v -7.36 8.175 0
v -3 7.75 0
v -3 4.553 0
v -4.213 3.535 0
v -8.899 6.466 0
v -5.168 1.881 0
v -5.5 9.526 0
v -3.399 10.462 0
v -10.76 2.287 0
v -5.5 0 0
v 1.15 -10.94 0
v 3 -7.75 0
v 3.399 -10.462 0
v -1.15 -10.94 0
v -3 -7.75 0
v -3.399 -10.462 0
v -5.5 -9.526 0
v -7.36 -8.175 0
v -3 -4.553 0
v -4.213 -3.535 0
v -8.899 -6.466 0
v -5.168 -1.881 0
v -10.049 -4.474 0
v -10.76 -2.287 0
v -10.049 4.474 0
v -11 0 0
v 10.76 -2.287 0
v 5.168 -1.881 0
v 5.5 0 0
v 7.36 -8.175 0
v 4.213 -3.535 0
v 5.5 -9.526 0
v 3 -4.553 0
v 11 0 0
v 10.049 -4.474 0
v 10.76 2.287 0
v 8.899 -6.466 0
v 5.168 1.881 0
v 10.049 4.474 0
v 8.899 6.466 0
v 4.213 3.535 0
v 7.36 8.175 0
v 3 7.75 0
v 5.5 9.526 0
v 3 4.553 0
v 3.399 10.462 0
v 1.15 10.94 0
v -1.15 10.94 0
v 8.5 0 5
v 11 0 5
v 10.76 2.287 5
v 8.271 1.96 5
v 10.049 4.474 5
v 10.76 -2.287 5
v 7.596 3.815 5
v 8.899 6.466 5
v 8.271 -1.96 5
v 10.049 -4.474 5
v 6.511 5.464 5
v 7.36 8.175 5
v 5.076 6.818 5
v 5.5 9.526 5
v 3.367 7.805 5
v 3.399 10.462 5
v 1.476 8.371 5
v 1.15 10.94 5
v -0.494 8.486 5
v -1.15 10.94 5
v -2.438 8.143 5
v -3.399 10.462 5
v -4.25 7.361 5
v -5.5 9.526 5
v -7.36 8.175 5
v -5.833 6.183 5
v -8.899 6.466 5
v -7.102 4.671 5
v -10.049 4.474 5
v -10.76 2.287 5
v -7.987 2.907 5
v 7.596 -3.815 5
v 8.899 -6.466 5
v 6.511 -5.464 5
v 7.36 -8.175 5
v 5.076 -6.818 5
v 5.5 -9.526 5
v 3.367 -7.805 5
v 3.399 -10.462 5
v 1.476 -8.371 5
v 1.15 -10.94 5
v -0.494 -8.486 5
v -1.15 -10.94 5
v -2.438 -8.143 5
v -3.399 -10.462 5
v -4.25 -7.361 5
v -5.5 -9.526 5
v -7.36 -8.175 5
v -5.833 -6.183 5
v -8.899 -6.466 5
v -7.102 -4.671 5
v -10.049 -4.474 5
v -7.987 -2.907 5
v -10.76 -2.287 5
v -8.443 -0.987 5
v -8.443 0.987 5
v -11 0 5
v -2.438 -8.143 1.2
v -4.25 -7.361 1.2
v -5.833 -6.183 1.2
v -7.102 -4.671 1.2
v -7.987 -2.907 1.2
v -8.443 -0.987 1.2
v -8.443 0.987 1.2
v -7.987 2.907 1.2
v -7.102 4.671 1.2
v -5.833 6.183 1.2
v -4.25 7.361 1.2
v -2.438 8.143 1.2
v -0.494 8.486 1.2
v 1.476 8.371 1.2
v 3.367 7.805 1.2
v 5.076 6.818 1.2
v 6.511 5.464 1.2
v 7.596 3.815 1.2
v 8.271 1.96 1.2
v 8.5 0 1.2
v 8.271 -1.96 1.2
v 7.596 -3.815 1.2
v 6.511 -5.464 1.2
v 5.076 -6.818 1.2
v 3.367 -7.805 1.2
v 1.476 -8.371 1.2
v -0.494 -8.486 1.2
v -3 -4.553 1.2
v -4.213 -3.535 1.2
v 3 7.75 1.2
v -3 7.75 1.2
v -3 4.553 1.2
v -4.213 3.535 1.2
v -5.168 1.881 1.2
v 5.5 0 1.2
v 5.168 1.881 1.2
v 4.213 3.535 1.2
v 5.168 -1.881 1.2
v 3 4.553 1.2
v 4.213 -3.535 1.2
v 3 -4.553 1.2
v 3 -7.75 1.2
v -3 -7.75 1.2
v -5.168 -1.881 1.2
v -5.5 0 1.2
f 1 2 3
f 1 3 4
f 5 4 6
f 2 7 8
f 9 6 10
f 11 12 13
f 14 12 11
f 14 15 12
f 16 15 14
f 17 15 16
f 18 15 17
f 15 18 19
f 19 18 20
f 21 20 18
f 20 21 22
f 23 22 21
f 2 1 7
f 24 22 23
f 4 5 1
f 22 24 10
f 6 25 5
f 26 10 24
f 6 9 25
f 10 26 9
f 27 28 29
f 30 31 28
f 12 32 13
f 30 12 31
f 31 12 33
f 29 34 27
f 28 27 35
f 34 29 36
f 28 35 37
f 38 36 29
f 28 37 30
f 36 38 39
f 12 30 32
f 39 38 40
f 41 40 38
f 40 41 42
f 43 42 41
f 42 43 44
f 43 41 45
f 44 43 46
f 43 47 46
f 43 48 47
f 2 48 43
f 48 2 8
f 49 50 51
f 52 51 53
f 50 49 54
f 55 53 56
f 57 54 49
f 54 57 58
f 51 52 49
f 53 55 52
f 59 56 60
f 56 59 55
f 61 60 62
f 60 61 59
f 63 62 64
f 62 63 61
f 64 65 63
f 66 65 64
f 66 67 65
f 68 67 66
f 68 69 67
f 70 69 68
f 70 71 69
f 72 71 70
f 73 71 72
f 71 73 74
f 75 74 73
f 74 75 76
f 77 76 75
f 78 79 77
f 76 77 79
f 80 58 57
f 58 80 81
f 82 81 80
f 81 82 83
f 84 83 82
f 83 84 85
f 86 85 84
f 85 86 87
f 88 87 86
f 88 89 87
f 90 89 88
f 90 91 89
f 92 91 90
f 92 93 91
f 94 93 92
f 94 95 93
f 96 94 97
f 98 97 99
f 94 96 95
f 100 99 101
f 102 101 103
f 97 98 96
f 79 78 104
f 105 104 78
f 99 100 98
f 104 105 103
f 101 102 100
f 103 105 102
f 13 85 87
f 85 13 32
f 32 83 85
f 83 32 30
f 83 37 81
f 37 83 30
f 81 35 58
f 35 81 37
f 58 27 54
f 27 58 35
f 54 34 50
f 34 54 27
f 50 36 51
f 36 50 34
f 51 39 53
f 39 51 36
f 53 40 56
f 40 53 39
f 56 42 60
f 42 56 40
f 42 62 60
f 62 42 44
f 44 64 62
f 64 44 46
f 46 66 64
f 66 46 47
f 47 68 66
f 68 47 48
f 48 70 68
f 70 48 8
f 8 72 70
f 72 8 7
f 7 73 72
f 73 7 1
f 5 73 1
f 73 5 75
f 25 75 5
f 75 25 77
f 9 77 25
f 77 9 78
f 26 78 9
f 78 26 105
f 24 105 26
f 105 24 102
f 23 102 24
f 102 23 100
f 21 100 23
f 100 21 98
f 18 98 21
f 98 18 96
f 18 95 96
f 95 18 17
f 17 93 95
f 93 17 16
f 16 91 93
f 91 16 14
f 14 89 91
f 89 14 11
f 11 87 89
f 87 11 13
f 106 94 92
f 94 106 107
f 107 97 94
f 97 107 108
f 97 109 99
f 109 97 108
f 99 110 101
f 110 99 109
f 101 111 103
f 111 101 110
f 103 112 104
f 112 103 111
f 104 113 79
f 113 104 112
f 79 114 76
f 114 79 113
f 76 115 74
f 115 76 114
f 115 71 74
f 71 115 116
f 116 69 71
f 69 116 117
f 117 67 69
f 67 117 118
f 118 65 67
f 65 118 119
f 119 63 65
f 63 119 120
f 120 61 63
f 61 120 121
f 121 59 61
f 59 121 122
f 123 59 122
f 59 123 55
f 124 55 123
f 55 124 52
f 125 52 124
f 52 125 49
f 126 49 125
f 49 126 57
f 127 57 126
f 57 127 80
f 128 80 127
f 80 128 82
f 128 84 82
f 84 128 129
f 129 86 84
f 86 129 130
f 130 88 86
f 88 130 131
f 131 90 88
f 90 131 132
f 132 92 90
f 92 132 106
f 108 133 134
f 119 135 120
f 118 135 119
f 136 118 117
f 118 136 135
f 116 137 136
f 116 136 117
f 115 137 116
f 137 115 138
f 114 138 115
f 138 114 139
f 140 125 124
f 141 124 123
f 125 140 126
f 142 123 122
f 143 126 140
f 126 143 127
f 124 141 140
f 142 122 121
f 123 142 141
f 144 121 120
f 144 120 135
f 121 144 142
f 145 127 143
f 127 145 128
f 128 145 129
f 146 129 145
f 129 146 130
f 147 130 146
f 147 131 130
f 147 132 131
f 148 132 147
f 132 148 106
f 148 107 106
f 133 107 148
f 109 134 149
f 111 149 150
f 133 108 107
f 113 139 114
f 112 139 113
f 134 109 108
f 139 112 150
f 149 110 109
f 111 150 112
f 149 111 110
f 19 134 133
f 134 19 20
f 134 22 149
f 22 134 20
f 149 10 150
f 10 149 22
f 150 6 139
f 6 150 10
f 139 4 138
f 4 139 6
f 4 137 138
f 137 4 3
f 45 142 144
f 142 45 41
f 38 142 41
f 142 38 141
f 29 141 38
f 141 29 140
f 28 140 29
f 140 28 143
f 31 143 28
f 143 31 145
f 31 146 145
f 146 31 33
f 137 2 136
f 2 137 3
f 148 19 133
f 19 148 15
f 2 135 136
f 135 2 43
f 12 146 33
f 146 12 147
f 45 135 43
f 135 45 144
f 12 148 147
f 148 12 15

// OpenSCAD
module connector_female(thickness=3, height=5) {
    difference() {
        union() {
            linear_extrude(height) {
                difference() {
                    circle(16/2 + thickness);
                    circle(17/2);
                }
            }
            
            linear_extrude(1.2) {
                difference() {
                    circle(16/2 + thickness);
                    circle(11/2);
                }
            }
        }

        linear_extrude(10, center=true)
        square([6,15.5], true);
    }
}

connector_female();
